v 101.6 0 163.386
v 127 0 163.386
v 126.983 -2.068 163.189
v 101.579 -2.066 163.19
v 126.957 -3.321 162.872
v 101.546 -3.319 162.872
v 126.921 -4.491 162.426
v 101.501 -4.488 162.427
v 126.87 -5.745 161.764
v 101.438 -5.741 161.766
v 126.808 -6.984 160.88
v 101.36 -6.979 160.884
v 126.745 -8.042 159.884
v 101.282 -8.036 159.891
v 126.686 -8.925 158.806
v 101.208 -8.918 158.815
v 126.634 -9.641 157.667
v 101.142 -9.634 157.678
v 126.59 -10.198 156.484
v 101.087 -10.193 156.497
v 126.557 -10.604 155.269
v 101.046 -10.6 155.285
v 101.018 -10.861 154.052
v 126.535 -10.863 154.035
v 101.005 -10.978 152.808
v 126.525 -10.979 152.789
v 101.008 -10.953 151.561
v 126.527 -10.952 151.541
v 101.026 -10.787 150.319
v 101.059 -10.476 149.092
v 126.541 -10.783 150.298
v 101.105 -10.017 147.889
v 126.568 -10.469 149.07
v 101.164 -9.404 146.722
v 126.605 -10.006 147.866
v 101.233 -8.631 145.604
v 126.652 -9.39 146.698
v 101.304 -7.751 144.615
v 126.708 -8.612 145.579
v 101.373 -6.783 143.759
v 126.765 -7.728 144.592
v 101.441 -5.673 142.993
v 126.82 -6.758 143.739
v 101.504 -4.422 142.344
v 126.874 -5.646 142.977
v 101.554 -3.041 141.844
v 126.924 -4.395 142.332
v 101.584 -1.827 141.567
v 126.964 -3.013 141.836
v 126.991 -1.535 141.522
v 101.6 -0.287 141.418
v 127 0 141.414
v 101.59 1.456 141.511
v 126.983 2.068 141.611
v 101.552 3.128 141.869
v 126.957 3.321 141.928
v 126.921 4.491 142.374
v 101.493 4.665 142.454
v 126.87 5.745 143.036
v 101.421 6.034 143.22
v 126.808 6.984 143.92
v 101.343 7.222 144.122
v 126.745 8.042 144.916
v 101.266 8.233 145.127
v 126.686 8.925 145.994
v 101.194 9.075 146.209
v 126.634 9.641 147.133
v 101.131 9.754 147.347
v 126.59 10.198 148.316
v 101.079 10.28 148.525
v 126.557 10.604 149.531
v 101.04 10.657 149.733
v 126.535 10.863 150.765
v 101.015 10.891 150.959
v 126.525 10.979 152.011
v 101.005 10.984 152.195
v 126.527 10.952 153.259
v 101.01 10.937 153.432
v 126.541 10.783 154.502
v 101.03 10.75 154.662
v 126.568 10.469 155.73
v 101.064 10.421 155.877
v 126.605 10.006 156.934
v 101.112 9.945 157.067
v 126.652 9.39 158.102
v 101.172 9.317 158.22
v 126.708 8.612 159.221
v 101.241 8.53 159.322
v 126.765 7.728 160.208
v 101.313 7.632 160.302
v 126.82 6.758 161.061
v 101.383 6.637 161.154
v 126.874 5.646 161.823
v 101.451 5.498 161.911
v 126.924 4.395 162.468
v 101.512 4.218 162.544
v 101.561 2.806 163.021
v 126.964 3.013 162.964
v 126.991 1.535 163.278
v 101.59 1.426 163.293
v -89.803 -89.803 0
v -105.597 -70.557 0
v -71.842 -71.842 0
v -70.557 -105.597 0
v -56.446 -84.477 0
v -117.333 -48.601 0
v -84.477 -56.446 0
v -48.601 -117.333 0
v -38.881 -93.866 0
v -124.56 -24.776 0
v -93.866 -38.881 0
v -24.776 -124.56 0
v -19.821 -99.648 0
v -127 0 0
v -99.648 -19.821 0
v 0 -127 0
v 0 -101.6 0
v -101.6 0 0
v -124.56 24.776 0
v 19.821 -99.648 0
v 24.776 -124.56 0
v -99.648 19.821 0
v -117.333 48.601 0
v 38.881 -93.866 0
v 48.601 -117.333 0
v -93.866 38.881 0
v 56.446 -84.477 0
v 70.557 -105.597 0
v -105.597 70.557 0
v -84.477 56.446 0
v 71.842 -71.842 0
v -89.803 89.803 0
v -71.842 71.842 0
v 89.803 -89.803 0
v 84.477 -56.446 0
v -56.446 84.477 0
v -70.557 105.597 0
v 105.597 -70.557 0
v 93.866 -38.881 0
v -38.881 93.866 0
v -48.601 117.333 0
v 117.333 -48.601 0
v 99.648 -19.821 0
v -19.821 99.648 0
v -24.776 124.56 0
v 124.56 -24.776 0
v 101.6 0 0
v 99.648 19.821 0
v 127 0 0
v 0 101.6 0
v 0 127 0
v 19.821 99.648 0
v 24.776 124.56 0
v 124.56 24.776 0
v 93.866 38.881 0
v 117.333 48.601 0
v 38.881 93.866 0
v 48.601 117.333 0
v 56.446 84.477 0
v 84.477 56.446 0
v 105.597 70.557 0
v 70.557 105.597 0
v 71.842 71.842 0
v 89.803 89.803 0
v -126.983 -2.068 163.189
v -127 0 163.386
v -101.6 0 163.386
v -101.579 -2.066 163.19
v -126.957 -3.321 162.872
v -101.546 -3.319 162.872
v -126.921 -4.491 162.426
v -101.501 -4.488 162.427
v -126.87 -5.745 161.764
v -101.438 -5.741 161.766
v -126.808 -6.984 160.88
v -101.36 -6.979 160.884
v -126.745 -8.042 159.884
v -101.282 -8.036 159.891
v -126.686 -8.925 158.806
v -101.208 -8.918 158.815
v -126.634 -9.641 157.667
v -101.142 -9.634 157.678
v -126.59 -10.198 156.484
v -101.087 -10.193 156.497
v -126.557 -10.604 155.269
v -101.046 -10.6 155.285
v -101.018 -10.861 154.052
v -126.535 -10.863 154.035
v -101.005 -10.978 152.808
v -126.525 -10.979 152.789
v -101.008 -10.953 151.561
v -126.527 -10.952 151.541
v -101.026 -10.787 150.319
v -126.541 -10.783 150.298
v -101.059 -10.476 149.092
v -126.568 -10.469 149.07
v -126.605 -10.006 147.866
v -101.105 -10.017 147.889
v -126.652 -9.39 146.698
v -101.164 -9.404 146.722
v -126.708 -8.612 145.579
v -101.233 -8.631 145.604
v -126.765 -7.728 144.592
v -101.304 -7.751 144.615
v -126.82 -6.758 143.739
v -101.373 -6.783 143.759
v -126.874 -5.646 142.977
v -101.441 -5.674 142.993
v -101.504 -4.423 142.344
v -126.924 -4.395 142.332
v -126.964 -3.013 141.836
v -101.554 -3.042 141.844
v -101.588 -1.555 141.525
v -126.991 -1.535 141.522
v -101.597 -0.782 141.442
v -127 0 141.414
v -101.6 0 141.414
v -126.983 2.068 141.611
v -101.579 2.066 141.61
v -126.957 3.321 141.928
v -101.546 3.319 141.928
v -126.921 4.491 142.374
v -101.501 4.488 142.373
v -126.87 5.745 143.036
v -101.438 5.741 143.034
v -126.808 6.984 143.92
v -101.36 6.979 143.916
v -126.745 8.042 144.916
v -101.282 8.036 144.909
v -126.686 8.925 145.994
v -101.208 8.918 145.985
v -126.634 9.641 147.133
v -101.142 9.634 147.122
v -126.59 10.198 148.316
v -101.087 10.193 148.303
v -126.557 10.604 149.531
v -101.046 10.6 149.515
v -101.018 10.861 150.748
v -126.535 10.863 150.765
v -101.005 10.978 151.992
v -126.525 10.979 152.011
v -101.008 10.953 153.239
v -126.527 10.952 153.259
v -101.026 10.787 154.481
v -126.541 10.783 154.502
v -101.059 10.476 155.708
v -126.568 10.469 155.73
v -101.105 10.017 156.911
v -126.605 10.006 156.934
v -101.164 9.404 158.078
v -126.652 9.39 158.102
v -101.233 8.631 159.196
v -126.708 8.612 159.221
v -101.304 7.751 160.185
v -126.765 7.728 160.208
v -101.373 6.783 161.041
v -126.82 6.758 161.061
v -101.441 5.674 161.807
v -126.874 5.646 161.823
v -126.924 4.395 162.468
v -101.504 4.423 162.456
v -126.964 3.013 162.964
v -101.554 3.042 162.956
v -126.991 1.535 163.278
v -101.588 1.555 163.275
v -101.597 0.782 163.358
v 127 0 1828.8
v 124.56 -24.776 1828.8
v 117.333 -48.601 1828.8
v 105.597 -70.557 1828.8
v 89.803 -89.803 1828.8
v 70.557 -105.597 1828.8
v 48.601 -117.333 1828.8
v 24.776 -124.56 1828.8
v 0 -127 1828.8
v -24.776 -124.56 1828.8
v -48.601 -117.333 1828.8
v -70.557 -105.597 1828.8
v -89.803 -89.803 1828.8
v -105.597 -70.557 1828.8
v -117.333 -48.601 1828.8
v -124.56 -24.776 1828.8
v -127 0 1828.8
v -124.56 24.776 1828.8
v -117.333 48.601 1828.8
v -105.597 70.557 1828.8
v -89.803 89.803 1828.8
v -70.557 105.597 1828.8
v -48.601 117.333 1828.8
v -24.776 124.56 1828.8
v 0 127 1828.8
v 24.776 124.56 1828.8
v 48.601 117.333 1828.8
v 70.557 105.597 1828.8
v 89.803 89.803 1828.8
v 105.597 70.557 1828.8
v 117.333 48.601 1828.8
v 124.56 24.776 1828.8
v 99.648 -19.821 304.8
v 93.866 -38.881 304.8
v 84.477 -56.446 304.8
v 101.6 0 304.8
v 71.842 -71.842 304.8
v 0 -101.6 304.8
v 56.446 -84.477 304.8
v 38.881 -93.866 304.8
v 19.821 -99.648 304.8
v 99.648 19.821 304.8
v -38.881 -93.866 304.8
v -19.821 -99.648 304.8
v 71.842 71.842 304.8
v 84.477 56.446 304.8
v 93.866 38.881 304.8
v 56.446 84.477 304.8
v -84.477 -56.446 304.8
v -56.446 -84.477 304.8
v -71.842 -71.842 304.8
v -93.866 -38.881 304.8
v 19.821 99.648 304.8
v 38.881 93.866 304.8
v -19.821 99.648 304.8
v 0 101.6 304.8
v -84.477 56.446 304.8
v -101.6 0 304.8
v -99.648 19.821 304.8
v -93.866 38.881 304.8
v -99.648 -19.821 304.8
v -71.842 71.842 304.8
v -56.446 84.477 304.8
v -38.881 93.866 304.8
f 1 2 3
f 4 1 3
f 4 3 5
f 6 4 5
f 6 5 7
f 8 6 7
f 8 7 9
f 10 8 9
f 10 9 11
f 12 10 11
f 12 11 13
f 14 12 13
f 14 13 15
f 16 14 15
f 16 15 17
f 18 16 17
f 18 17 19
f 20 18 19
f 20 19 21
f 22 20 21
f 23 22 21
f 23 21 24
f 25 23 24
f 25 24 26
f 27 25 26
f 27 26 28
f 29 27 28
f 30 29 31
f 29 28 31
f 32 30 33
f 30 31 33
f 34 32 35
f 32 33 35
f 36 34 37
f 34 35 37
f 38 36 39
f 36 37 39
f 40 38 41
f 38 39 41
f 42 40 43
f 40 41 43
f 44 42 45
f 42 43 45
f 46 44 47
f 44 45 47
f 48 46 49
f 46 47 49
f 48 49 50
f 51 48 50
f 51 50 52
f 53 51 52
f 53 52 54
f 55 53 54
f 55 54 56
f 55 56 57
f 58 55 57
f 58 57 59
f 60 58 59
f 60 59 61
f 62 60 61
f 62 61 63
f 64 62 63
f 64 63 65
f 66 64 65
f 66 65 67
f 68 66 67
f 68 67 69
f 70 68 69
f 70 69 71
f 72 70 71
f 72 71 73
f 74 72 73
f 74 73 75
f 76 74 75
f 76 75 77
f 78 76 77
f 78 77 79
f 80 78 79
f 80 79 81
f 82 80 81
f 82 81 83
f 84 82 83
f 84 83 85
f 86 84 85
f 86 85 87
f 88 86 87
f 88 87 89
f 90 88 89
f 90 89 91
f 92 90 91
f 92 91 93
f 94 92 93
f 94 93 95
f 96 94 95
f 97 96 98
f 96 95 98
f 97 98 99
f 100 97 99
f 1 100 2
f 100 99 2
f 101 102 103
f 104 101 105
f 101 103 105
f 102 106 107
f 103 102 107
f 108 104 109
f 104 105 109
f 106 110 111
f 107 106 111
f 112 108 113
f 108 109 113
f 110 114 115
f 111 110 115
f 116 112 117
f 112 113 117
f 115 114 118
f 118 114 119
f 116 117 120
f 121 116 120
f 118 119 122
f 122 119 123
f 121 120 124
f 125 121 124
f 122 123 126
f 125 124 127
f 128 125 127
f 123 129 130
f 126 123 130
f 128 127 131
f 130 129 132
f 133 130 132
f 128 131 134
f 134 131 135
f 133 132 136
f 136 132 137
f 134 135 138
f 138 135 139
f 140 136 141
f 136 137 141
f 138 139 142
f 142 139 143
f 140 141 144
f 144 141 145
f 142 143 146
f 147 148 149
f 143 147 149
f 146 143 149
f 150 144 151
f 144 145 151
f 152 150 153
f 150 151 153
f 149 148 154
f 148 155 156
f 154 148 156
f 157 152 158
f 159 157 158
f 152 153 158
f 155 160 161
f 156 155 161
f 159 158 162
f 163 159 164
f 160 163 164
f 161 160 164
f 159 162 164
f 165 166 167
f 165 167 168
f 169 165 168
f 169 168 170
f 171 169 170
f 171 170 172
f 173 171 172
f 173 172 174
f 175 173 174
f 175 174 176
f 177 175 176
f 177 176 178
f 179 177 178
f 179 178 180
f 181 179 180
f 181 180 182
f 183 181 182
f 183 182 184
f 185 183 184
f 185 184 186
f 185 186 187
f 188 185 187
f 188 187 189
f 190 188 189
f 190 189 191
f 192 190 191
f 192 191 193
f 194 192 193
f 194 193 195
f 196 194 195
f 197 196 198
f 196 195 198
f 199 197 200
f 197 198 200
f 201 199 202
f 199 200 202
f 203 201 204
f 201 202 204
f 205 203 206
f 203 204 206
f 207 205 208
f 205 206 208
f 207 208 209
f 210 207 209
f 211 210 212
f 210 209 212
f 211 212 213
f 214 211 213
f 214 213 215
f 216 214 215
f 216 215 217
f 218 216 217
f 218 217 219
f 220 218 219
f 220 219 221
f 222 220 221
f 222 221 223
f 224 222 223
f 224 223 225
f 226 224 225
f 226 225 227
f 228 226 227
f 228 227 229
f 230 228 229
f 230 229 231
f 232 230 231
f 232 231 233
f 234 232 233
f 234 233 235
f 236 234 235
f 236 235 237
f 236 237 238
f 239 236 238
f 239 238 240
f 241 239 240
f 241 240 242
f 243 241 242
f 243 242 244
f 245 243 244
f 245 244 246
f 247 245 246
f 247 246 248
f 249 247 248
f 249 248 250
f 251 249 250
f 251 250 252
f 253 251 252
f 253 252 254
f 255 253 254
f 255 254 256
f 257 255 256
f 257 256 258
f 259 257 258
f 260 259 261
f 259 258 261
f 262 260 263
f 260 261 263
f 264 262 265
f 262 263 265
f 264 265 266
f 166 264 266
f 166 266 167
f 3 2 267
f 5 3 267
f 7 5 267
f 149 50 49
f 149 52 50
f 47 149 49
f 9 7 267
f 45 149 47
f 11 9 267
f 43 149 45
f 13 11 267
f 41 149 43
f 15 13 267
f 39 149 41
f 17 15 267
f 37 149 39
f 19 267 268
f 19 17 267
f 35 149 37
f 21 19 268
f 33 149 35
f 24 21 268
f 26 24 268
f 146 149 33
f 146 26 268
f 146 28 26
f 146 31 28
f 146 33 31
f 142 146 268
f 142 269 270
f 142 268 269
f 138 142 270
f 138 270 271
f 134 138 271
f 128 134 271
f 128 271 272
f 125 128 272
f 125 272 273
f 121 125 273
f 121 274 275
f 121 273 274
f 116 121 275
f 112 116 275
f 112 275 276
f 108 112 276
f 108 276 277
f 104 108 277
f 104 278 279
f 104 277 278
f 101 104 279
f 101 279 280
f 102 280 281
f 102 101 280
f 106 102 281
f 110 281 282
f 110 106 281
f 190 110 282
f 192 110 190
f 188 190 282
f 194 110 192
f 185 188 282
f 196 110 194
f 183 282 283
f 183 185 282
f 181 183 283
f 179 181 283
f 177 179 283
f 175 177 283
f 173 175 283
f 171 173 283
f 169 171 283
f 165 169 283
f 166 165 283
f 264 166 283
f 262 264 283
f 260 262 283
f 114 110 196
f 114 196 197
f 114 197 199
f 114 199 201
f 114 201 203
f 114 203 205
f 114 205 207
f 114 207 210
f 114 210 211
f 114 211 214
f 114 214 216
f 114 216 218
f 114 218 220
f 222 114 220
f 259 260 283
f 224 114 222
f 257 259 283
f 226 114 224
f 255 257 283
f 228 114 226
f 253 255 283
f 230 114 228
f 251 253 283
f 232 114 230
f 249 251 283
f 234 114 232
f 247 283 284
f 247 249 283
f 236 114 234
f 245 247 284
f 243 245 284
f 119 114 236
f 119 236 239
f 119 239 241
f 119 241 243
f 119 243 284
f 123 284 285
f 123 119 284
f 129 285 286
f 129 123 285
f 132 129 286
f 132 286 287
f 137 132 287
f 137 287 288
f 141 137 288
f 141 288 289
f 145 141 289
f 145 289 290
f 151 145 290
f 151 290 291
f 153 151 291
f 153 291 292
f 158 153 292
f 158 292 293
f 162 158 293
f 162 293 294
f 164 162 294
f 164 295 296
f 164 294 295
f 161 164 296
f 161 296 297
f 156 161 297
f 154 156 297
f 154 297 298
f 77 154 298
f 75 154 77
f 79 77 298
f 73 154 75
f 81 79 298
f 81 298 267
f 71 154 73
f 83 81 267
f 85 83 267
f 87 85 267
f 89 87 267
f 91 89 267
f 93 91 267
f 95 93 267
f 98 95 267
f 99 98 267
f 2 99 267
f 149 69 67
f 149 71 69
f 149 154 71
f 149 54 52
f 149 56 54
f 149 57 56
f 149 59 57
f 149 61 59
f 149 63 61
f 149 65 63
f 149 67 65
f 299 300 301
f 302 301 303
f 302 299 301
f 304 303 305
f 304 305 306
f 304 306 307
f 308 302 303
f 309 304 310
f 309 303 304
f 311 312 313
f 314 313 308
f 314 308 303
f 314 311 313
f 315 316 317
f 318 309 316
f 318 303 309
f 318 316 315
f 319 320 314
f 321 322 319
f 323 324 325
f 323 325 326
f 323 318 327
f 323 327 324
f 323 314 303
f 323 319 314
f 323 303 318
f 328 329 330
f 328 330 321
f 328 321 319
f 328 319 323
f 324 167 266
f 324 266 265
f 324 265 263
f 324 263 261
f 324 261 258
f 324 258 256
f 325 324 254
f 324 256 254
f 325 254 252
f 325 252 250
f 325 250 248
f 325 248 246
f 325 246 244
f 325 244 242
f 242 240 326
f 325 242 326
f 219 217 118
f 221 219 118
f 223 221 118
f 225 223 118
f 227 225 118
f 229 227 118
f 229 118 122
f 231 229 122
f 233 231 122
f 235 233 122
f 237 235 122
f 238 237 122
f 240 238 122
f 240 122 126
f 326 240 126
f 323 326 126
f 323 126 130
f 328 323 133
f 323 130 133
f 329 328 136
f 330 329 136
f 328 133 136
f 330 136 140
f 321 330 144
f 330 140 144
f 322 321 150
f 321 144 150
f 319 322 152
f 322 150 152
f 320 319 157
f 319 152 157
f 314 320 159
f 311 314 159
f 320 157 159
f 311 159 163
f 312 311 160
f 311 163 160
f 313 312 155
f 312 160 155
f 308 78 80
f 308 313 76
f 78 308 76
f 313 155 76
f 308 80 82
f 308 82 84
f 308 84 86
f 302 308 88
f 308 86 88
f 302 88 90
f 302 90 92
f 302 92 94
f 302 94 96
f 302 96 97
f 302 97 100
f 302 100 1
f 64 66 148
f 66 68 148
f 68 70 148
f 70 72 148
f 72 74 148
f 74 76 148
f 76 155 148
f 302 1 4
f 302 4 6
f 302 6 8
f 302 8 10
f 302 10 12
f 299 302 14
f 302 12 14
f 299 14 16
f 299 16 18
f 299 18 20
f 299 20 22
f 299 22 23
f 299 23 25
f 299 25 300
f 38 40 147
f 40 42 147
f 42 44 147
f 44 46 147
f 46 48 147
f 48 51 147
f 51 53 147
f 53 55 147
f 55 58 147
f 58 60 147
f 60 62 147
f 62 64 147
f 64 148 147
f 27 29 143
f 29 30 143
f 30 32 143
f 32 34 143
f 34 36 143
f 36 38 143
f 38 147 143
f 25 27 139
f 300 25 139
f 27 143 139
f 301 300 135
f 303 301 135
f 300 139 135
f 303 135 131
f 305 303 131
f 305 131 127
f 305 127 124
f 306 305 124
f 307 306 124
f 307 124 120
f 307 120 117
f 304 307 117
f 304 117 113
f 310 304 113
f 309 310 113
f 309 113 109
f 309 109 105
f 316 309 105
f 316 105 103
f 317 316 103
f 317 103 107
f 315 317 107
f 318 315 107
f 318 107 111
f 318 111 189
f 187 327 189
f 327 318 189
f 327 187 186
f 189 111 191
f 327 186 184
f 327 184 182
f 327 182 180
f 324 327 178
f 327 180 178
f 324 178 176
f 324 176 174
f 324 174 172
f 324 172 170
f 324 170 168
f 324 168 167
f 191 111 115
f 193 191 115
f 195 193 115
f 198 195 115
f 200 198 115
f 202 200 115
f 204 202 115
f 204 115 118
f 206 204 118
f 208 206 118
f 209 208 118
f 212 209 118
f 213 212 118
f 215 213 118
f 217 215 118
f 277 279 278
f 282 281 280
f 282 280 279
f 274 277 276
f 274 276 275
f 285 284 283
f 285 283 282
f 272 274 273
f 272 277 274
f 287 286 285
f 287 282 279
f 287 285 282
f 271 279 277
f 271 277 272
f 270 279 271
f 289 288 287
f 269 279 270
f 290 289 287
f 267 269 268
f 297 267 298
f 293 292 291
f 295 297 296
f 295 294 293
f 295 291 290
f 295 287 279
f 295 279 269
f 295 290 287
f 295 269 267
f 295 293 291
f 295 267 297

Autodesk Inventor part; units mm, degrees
ref_plane "XZ Plane" through (0, 0, 0) normal (0, 1, 0) x (-1, 0, 0)
ref_plane "XY Plane" through (0, 0, 0) normal (0, 0, 1) x (1, 0, 0)
sketch "Sketch1" plane through (0, 0, 0) normal (0, 0, 1) x (1, 0, 0)
  circle A0 centre (0, 0) radius 127
  dimension "d0" = 254
extrude "Extrusion1" add sketch "Sketch1" along normal blind 1828.8
ref_plane "Work Plane1" through (-127, 0, 0) normal (1, 0, 0) x (0, 1, 0)
sketch "Sketch2" plane through (0, 0, 0) normal (0, 0, -1) x (-1, 0, 0)
  circle A0 centre (0, 0) radius 101.6
  dimension "d3" = 203.2
extrude "Extrusion2" cut sketch "Sketch2" against normal blind 304.8
sketch "Sketch3" plane through (-127, 0, 0) normal (1, 0, 0) x (0, 1, 0)
  circle A0 centre (0, 152.4) radius 12.7
  point P0 (0, 0)
  dimension "d6" = 25.4
  dimension "d7" = 152.4
hole "Hole1" at (-127, 0, 152.4) direction (1, 0, 0) diameter 21.971 end through all thread size "1-8 UNC" class "2B" standard "ANSI Unified Screw Threads"
properties part number "OuterRadiusPoleAJB"
